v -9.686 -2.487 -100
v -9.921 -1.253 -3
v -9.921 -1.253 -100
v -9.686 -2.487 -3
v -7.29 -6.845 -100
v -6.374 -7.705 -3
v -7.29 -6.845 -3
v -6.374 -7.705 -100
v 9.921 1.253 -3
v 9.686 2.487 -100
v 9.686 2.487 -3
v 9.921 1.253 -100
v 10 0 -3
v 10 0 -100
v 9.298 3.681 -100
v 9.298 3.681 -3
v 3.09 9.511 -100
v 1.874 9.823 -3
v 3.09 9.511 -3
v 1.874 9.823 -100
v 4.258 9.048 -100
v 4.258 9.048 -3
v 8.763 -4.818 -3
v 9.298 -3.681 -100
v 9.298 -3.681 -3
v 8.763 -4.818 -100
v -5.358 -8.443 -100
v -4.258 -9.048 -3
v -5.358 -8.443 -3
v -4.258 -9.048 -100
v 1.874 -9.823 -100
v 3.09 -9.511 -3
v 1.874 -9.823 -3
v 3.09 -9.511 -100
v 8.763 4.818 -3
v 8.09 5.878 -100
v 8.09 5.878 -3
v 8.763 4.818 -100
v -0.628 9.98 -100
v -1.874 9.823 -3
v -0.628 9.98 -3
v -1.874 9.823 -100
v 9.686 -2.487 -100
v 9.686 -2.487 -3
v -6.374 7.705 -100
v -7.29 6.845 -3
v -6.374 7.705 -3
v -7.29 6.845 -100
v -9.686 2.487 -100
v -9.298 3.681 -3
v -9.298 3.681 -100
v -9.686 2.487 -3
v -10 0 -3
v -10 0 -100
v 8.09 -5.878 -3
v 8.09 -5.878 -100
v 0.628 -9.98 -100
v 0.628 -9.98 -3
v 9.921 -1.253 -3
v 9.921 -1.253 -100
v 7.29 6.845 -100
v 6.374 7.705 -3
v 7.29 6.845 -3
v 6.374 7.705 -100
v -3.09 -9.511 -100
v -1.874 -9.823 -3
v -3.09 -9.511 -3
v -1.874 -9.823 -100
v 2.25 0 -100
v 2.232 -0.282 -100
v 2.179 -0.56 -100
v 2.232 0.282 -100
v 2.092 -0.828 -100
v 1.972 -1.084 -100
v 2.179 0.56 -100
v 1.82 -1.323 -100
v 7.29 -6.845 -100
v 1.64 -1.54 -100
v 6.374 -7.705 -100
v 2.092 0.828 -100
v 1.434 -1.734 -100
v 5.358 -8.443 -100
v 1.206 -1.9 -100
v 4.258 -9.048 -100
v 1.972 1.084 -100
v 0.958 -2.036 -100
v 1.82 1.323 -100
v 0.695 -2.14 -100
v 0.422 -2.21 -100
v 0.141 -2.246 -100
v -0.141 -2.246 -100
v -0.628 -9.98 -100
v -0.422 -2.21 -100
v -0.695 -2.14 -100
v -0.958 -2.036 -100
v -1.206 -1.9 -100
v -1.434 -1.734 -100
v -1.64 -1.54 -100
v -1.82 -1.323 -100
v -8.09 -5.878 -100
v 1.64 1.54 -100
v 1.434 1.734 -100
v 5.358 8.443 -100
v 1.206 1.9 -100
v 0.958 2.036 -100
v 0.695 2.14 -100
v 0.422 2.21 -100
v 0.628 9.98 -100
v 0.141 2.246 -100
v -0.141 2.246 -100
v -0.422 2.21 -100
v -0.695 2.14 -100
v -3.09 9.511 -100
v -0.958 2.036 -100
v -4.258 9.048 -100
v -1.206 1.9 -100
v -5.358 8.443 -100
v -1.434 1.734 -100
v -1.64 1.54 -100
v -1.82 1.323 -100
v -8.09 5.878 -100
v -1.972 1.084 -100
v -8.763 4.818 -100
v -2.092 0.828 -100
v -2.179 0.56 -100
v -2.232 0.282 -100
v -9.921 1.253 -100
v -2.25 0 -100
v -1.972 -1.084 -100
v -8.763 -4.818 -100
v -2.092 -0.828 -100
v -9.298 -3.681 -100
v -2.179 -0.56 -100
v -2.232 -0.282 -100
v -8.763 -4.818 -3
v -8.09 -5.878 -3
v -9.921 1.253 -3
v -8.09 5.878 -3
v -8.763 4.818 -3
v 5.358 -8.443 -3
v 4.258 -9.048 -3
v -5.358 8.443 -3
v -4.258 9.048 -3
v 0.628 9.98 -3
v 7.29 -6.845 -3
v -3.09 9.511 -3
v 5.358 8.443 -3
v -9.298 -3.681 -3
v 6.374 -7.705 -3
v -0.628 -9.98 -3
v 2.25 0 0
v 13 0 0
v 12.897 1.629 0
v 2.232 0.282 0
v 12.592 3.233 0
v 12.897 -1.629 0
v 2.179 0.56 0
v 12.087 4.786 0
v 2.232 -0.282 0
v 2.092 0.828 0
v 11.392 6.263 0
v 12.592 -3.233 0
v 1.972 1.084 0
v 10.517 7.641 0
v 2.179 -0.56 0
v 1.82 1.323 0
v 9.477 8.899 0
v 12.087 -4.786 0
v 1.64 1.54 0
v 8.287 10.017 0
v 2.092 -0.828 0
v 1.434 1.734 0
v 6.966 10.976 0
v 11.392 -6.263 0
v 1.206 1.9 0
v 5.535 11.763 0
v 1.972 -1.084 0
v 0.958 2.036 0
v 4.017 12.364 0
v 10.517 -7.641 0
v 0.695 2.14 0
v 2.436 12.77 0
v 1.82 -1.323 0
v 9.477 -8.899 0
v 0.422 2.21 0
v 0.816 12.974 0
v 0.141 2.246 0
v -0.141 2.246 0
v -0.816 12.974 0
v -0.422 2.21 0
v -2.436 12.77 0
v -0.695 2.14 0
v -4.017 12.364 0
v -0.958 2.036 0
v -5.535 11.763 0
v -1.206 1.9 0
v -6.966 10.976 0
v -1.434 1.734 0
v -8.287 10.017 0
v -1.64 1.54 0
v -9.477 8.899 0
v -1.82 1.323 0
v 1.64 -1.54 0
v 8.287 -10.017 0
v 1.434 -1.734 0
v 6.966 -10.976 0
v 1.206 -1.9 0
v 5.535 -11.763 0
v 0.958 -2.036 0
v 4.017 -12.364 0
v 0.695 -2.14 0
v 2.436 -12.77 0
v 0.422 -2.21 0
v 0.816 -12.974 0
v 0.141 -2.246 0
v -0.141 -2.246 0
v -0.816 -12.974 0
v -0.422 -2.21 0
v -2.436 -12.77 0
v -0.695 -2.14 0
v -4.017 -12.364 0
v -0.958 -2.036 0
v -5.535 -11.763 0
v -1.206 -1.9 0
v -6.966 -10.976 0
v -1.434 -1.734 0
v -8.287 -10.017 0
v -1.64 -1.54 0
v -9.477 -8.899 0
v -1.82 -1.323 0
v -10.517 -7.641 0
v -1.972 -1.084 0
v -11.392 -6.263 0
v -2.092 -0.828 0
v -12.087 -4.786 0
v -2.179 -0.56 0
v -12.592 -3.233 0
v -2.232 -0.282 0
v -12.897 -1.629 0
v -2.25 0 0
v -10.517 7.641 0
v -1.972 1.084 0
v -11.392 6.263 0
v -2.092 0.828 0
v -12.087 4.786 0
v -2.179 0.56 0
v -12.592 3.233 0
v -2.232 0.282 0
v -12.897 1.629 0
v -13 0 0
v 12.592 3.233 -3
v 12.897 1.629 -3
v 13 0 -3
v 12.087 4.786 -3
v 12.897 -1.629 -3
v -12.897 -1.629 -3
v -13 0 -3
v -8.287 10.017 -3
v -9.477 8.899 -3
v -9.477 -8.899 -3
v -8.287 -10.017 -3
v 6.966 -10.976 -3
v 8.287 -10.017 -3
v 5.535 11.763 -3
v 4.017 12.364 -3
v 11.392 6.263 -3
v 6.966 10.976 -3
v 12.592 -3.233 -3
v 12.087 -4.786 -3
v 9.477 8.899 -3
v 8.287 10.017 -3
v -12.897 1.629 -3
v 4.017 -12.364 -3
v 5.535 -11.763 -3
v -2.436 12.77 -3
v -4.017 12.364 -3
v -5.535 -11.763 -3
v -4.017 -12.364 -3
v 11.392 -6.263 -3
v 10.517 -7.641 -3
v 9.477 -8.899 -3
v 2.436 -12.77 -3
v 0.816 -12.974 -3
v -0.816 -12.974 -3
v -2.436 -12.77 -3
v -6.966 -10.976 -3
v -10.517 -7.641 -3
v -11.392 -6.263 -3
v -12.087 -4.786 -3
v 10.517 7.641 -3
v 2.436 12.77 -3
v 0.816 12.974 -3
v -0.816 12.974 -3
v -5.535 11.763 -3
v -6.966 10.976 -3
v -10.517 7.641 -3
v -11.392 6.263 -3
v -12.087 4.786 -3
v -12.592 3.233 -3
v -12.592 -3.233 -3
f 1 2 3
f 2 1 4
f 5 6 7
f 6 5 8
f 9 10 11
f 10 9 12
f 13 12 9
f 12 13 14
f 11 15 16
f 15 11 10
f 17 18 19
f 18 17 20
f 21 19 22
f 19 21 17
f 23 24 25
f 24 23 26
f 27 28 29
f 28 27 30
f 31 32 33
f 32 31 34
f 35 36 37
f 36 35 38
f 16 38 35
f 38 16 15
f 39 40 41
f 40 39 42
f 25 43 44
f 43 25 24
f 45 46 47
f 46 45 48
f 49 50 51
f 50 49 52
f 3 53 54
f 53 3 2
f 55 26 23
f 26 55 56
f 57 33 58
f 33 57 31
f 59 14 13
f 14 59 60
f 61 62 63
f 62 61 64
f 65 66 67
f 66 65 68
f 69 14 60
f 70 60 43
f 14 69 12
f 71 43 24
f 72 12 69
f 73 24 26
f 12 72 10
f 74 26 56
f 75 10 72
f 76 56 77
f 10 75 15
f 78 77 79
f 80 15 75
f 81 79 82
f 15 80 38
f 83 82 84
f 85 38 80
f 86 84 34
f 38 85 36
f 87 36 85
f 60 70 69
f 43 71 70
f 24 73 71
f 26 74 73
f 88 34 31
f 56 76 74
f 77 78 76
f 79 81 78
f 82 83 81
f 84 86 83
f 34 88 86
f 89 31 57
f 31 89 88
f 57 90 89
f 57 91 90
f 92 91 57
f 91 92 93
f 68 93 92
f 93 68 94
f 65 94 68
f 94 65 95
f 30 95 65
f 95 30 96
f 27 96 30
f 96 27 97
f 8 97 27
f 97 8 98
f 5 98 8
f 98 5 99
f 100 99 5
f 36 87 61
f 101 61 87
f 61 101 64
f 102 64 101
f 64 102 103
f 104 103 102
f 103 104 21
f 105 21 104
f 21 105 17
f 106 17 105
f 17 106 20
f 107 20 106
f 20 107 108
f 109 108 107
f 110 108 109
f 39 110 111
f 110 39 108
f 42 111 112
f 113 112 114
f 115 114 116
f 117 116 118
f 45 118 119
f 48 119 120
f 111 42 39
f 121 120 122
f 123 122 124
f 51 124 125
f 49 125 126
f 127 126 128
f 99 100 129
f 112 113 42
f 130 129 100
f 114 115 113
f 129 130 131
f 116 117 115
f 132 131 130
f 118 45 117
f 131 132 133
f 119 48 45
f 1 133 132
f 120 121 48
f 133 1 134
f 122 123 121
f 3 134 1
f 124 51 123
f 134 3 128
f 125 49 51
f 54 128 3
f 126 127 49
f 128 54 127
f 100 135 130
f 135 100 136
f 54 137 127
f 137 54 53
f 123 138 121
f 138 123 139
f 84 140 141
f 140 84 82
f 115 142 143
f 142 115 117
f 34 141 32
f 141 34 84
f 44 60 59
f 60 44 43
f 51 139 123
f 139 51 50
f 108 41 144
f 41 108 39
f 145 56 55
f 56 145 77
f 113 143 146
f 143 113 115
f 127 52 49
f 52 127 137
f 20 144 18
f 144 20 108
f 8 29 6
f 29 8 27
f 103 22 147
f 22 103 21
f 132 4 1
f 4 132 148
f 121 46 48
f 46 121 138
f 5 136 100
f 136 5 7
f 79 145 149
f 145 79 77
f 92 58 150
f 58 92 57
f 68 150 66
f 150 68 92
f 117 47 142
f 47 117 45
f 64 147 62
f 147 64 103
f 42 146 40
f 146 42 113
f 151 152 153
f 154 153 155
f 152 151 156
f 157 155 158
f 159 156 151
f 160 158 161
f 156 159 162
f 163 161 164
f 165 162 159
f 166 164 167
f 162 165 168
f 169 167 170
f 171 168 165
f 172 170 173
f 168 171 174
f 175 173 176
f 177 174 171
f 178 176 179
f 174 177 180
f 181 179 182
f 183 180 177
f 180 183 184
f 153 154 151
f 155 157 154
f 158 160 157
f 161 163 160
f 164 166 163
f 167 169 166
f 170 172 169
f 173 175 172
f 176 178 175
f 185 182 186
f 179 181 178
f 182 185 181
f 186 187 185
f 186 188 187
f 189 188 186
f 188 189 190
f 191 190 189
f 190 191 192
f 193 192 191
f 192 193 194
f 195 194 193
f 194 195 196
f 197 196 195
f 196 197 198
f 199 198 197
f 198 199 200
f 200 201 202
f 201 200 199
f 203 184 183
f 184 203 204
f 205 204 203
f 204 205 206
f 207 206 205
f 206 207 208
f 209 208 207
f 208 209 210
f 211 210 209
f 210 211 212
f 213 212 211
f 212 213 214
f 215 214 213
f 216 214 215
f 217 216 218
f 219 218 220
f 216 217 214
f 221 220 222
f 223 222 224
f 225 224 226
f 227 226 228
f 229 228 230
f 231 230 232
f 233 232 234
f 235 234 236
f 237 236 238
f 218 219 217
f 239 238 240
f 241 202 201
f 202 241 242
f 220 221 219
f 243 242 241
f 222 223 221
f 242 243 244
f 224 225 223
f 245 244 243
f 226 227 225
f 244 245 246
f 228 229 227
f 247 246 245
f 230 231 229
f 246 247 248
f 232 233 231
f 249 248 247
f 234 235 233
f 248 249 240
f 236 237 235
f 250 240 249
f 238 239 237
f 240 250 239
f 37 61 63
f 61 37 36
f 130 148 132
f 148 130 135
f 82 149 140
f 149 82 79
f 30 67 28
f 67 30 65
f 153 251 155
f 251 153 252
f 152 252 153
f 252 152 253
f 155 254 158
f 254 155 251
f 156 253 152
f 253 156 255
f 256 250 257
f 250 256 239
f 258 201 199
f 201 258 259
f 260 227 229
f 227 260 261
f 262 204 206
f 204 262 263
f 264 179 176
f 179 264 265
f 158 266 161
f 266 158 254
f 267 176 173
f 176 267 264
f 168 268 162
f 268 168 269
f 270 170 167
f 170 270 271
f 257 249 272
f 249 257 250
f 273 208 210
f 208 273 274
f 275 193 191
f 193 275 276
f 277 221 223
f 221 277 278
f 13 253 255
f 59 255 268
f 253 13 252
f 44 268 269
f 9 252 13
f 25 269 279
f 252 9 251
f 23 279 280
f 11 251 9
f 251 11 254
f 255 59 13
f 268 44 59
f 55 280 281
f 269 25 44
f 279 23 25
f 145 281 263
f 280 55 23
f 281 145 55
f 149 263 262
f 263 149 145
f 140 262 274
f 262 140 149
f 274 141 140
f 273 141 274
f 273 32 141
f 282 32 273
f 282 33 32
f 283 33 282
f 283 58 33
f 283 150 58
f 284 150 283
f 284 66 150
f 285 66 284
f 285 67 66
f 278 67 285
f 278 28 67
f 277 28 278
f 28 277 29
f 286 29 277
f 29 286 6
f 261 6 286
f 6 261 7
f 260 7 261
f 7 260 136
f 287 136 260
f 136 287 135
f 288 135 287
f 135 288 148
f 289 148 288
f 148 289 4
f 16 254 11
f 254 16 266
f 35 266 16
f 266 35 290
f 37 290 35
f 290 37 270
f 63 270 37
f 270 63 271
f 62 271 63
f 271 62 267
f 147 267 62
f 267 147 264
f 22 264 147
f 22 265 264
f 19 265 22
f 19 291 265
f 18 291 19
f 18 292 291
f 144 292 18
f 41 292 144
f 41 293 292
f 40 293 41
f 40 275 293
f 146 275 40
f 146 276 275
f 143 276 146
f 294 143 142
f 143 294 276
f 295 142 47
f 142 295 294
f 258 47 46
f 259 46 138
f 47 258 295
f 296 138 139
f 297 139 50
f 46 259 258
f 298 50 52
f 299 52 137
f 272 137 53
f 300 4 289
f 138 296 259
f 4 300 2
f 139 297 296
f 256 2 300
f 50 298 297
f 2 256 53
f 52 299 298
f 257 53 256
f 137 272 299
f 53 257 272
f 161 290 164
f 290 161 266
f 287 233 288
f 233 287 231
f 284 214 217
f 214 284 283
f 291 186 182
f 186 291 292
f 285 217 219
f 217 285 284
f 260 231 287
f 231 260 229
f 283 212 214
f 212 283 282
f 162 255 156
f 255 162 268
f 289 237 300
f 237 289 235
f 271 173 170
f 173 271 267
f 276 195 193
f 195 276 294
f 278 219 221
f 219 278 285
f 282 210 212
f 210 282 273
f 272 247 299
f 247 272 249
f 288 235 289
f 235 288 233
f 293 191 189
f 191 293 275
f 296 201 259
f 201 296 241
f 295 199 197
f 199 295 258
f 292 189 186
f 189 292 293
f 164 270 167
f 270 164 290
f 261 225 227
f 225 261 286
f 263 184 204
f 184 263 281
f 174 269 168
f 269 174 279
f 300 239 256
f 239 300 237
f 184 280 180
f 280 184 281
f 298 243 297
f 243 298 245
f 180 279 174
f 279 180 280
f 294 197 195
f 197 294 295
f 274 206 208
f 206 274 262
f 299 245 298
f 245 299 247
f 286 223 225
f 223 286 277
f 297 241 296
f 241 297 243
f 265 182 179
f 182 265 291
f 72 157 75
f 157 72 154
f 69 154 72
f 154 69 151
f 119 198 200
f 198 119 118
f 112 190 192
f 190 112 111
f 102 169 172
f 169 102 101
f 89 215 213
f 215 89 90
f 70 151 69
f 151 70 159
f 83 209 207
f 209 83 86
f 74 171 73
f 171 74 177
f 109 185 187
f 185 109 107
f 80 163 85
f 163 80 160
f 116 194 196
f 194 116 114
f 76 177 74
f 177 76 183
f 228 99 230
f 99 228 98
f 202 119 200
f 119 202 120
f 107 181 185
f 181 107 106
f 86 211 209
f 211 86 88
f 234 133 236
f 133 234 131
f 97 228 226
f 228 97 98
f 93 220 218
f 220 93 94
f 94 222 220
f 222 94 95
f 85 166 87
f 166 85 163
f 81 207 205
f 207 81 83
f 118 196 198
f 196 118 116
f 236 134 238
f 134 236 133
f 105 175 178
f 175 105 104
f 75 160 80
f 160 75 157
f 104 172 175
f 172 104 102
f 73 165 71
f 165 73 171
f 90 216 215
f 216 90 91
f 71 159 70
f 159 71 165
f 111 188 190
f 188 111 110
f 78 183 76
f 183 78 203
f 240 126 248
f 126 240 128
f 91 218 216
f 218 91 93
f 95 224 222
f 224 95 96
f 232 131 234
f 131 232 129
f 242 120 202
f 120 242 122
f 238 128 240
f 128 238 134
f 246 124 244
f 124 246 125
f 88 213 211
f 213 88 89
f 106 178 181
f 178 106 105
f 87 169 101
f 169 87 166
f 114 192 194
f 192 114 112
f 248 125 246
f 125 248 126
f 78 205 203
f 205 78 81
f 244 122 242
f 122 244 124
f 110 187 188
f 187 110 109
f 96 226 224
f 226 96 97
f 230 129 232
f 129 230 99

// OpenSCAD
$fn = 50;


difference() {
	union() {
		translate(v = [0, 0, -100.0000000000]) {
			cylinder(h = 100, r = 10.0000000000);
		}
		translate(v = [0, 0, -3.0000000000]) {
			cylinder(h = 3, r = 13.0000000000);
		}
	}
	union() {
		#translate(v = [0, 0, -100]) {
			cylinder(h = 100, r = 2.2500000000);
		}
	}
}
